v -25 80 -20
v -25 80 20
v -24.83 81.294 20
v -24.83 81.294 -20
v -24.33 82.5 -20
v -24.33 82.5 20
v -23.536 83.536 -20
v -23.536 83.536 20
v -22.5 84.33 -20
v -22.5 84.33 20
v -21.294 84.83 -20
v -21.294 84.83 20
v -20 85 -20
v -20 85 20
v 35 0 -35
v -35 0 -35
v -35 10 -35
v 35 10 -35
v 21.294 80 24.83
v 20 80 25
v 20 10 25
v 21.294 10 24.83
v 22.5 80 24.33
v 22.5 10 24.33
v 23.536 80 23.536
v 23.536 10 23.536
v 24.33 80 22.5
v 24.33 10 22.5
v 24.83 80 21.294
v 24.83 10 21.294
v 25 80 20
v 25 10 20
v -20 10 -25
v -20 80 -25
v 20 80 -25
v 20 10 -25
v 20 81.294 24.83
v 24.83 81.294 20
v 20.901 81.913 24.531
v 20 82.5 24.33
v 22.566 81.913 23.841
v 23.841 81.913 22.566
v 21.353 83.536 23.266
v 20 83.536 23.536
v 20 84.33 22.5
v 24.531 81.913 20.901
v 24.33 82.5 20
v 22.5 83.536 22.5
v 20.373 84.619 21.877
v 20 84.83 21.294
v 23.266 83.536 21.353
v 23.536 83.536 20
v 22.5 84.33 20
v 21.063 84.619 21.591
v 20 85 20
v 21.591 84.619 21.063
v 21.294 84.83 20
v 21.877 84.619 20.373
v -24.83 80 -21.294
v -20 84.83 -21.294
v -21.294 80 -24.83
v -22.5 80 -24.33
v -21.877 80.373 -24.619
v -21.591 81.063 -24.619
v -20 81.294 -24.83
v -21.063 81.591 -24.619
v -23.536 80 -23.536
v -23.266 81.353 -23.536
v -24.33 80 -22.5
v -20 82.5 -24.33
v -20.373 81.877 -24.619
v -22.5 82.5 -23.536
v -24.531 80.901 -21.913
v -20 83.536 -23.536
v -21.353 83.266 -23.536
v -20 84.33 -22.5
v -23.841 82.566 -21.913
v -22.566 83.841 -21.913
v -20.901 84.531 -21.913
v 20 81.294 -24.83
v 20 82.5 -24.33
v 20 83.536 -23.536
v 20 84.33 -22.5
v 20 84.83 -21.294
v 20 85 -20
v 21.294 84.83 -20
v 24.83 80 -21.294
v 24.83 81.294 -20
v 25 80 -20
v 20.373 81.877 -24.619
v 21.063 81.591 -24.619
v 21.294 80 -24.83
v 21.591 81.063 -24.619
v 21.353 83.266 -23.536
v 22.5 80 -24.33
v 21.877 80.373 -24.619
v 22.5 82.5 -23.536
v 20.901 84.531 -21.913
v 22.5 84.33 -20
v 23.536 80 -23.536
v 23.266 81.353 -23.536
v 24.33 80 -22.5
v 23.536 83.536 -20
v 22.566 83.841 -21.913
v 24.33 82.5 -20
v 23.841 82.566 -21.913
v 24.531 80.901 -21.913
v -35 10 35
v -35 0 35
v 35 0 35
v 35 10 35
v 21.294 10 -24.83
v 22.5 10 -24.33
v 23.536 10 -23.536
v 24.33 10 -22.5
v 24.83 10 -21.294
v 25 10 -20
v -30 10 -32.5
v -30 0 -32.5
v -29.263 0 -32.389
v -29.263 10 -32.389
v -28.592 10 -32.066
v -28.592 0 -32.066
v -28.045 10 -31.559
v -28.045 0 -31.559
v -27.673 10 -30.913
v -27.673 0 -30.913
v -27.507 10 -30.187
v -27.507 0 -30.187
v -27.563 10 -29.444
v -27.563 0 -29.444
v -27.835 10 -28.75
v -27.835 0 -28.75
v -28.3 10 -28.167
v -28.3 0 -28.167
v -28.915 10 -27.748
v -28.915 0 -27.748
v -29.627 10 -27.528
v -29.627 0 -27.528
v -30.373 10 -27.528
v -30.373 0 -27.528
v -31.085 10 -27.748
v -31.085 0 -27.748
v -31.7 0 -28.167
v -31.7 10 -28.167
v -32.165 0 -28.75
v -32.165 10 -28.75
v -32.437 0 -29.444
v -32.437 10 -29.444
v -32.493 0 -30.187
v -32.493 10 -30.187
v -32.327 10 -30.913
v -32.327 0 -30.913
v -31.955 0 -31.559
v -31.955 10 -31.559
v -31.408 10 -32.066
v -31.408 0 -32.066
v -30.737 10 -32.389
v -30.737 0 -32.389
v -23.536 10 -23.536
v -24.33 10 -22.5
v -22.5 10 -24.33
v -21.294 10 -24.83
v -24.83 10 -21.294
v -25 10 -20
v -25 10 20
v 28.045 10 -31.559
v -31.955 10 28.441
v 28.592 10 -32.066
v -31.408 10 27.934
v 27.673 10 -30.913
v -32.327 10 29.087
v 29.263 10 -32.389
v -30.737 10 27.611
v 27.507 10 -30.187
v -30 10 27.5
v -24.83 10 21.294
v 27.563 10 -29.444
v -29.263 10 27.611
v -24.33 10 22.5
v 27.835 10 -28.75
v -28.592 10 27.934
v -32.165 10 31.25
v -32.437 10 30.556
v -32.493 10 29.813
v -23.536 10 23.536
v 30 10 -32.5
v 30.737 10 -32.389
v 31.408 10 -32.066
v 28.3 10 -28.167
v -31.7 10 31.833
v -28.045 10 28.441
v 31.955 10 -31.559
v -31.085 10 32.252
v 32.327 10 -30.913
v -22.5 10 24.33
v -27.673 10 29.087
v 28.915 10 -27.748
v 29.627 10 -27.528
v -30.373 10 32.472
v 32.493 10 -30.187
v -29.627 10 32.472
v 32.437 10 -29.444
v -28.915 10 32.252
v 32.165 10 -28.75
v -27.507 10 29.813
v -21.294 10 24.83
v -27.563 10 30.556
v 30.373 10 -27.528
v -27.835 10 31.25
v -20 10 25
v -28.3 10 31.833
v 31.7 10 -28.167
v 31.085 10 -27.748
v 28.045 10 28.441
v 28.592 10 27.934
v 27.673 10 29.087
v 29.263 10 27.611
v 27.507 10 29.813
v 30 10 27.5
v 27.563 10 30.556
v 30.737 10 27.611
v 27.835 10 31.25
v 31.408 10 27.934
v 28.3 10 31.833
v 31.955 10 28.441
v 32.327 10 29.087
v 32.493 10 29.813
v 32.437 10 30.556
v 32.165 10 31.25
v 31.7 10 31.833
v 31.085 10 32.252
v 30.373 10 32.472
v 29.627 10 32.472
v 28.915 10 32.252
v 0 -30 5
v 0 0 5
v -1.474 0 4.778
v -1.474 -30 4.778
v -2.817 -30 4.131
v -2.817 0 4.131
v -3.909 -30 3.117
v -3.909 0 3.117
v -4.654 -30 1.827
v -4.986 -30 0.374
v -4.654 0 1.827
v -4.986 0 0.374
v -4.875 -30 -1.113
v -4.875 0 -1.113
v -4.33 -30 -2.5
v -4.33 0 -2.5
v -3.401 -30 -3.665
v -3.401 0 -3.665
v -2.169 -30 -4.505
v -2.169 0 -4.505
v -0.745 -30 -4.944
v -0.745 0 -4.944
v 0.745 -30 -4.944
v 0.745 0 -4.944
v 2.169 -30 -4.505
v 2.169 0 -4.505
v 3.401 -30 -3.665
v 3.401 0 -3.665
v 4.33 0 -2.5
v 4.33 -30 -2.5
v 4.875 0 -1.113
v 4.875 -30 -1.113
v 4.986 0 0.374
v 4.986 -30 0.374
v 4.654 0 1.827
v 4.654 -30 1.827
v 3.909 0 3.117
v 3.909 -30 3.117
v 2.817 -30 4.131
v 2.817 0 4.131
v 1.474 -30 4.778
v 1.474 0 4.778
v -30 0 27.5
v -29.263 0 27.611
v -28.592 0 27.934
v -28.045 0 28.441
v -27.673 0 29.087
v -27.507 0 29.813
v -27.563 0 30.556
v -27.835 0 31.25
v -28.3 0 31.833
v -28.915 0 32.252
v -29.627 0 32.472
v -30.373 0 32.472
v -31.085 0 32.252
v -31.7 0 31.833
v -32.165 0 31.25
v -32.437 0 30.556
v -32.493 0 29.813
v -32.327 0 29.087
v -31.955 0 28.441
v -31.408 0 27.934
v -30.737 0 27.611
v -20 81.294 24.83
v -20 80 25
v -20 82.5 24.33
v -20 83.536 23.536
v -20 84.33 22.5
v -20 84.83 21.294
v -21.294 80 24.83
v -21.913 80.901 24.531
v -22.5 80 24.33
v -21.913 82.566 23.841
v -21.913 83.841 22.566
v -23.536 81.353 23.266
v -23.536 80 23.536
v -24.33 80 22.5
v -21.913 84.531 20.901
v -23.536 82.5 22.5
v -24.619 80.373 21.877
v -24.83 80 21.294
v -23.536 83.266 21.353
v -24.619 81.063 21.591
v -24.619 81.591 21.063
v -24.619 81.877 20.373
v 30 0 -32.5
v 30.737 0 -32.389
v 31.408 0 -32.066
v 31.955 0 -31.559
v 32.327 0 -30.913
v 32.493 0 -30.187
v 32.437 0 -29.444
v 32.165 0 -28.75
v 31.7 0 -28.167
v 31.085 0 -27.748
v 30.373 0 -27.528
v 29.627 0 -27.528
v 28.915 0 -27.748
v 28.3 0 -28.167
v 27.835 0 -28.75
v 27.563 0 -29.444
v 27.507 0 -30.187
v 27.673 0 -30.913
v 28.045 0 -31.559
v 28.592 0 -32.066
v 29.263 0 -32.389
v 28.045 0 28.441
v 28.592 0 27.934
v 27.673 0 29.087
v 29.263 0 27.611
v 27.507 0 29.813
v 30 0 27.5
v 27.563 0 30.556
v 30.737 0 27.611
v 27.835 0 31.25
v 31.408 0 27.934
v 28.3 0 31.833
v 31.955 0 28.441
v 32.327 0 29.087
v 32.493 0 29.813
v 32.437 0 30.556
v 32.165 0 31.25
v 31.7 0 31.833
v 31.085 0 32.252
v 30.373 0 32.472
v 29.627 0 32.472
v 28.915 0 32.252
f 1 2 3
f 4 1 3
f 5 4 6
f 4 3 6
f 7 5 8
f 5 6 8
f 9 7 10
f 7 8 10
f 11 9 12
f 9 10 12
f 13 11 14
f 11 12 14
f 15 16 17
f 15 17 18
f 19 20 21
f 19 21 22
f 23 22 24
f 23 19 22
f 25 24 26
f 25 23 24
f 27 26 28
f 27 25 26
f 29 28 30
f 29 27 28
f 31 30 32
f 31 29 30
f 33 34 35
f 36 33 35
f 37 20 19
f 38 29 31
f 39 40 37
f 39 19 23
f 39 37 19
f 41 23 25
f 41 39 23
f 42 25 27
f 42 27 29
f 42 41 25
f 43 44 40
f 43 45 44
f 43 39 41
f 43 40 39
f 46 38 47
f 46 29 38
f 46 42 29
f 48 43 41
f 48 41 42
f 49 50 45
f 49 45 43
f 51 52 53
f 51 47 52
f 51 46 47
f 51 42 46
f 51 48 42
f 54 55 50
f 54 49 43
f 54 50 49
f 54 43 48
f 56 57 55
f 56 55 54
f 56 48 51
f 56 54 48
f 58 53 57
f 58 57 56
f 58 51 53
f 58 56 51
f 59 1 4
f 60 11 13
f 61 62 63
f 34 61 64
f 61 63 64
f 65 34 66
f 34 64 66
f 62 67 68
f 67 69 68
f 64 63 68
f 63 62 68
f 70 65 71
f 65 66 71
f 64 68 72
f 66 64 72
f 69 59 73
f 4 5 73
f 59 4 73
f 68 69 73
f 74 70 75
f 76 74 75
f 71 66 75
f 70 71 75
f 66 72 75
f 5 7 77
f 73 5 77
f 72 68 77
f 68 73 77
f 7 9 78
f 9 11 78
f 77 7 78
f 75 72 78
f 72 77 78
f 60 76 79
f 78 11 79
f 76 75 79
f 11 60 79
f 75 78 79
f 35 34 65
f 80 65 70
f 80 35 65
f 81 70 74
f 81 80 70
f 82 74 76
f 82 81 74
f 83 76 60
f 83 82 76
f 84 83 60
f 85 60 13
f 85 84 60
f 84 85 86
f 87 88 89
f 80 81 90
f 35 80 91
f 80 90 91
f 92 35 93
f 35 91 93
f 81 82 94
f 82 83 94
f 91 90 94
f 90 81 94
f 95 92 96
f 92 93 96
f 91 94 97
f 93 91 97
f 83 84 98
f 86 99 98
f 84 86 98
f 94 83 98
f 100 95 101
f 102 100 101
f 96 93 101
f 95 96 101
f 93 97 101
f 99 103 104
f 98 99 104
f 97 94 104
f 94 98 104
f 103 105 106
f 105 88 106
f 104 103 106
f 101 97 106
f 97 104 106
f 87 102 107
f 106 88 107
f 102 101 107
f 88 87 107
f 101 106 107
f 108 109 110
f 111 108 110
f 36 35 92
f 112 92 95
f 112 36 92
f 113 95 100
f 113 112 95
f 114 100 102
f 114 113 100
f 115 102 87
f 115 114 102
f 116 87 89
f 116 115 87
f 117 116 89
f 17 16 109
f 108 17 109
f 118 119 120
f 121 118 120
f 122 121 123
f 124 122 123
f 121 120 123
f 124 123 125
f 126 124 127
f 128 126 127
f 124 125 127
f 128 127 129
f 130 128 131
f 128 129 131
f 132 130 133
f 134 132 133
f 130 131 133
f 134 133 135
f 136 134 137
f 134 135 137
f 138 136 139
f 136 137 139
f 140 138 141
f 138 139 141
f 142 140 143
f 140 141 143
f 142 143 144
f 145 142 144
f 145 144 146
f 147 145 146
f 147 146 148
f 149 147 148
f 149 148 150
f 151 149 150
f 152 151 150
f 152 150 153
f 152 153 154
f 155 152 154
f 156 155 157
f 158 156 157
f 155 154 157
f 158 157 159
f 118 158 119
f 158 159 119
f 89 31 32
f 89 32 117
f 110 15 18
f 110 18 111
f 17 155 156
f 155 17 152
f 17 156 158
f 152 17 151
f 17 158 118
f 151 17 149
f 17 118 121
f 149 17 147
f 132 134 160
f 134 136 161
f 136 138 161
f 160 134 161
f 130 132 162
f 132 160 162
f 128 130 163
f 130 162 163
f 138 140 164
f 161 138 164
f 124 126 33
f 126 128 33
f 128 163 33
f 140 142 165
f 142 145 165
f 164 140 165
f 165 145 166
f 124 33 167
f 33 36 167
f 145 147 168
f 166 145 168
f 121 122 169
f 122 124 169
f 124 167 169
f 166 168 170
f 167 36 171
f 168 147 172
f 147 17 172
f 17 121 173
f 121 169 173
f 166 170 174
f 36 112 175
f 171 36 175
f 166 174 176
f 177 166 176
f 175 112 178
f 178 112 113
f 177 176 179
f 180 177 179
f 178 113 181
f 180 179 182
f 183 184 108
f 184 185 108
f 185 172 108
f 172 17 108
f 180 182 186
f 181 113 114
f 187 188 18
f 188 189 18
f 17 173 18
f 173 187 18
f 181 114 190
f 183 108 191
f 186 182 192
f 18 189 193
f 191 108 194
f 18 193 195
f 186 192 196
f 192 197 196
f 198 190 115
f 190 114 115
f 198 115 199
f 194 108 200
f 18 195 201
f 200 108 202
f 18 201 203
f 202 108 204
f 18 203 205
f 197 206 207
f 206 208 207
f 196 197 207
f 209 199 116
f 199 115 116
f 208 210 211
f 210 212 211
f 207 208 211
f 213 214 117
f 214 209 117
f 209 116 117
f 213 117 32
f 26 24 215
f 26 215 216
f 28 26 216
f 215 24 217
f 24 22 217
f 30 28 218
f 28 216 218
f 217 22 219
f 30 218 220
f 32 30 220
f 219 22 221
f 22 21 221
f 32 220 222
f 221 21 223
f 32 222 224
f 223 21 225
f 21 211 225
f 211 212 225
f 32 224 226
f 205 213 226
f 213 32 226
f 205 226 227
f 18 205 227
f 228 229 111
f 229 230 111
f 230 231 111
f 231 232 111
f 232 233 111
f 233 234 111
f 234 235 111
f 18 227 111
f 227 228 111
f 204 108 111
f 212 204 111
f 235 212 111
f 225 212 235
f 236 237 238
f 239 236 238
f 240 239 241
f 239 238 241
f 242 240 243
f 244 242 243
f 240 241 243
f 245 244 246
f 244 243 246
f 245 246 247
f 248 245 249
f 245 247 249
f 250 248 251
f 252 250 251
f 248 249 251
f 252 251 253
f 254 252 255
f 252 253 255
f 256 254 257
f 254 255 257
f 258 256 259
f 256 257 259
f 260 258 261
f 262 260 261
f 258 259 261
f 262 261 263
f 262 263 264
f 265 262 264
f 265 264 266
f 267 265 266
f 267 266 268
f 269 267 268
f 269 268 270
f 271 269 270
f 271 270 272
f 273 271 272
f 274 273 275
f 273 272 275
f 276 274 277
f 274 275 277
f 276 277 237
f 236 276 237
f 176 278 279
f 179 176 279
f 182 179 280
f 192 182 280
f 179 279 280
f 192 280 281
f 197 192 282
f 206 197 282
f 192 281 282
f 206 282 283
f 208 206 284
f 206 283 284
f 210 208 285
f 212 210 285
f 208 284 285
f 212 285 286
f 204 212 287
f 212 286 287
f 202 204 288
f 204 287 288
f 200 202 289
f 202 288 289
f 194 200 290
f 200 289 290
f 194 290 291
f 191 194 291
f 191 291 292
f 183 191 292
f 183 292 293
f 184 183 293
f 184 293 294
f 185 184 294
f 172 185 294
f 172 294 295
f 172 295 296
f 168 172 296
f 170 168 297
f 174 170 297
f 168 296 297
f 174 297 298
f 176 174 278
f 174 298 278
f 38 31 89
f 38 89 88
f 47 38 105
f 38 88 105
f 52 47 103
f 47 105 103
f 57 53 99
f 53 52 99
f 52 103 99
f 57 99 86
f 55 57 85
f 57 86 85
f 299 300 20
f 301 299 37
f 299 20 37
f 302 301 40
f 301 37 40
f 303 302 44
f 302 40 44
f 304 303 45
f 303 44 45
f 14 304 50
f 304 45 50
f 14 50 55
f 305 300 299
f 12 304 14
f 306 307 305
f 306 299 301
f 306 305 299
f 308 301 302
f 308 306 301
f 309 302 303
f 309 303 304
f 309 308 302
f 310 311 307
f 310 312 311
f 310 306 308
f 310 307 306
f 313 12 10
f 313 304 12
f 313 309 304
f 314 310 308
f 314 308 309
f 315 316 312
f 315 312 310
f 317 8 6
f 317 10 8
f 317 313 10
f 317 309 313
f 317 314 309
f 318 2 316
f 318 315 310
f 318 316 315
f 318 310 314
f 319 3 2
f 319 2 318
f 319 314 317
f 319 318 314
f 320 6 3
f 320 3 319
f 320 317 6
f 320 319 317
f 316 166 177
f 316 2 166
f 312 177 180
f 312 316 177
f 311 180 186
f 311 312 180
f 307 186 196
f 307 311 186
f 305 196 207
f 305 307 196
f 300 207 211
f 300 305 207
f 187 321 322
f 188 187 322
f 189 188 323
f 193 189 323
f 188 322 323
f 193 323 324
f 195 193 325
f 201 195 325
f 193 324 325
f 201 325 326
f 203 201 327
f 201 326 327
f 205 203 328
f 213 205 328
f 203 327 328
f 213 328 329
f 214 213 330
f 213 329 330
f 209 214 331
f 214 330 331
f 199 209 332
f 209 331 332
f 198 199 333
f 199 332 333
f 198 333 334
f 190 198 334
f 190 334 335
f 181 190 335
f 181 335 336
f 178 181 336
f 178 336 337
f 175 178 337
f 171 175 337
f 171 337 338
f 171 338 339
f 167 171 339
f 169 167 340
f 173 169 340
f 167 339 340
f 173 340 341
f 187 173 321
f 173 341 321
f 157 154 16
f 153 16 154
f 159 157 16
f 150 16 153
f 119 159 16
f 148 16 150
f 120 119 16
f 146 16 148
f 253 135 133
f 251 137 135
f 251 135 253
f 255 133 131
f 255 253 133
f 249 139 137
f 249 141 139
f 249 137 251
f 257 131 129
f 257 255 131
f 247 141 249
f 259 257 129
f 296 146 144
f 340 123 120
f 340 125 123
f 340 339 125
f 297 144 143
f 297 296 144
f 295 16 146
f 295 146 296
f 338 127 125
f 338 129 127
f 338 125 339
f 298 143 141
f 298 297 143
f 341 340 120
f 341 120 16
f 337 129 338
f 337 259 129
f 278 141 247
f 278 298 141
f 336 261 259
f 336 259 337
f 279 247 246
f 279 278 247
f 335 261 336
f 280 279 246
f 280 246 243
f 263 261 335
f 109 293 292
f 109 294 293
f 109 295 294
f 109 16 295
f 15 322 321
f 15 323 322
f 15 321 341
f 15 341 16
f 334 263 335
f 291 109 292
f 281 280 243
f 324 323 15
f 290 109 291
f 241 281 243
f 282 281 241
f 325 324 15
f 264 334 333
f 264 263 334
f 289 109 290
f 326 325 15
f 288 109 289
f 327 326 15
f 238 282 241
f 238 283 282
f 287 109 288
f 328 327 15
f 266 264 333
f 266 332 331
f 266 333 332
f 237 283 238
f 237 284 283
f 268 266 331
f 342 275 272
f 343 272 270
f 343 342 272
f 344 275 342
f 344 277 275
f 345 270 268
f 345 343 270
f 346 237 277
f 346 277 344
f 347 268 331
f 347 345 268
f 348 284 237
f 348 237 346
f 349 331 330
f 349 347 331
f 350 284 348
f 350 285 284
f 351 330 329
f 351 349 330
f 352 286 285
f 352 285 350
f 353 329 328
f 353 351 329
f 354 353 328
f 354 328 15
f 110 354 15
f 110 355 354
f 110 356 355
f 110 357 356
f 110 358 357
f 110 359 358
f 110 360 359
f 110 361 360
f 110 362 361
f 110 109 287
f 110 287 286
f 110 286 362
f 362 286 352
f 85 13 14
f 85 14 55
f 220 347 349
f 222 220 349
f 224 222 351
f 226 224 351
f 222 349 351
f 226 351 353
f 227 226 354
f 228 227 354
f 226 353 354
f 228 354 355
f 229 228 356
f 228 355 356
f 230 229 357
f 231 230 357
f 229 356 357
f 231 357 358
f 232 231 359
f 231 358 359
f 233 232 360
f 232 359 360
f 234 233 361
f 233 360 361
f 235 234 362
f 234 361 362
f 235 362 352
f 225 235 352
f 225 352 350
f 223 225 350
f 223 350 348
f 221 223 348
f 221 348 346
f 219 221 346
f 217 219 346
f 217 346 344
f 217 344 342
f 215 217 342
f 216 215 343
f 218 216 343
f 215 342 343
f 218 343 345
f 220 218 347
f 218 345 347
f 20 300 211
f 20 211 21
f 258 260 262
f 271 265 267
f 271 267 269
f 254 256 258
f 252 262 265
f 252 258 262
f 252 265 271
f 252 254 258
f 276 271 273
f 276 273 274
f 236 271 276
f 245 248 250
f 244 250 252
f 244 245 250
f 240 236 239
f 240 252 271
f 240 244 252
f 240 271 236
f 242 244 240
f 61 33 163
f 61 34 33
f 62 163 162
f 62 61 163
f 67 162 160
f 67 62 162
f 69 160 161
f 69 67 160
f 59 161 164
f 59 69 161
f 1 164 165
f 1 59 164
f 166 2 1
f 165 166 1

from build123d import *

# Parameters (mm, degrees)
SKETCH1_W           = 50
SKETCH1_H           = 50
BOSS_EXTRUDE1_DEPTH = 85
SKETCH2_R           = 5
BOSS_EXTRUDE2_DEPTH = 30
FILLET1_R           = 5
FILLET2_R           = 5
SKETCH3_W           = 70
SKETCH3_H           = 70
BOSS_EXTRUDE3_DEPTH = 10
FILLET3_R           = 5
SKETCH4_R           = 2.5
CUT_EXTRUDE1_DEPTH  = 10


with BuildPart() as part:
    # Sketch1 → Boss-Extrude1 (new body)
    with BuildSketch(Plane(origin=(0, 0, 0), x_dir=(1, 0, 0), z_dir=(0, 1, 0))):
        Rectangle(SKETCH1_W, SKETCH1_H)
    extrude(amount=BOSS_EXTRUDE1_DEPTH)

    # Sketch2 → Boss-Extrude2 (add)
    with BuildSketch(Plane.XZ):
        with Locations(Location((0, 0, 0), (0, 0, 90))):
            Circle(SKETCH2_R)
    extrude(amount=BOSS_EXTRUDE2_DEPTH)

    # Fillet1
    fillet1_edges = [part.edges().sort_by_distance(p)[0] for p in [
        (0, 85, 25),
        (0, 0, 25),
        (25, 42.5, 25),
        (-25, 42.5, 25),
    ]]
    fillet(fillet1_edges, radius=FILLET1_R)

    # Fillet2
    # the kernel refuses this fillet: 5 mm, written as the material it takes off along each edge
    with BuildSketch(Plane(origin=(-20, 80, 20), x_dir=(0, 1, 0), z_dir=(-1, 0, 0))) as fillet2_piece_1_section:
        Polygon((0, 0), (FILLET2_R, 0), (FILLET2_R, -FILLET2_R), (0, -FILLET2_R), align=None)
    fillet2_piece_1 = extrude(amount=FILLET2_R, mode=Mode.PRIVATE)
    fillet2_piece_1 = fillet2_piece_1 - Plane(origin=(-20, 80, 20), x_dir=(0, -0.7071067811865475, -0.7071067811865475), z_dir=(-1, 0, 0)) * Sphere(FILLET2_R, mode=Mode.PRIVATE)
    add(fillet2_piece_1, mode=Mode.SUBTRACT)
    with BuildSketch(Plane(origin=(20, 80, 20), x_dir=(1, 0, 0), z_dir=(0, 1, 0))) as fillet2_piece_2_section:
        Polygon((0, 0), (FILLET2_R, 0), (FILLET2_R, -FILLET2_R), (0, -FILLET2_R), align=None)
    fillet2_piece_2 = extrude(amount=FILLET2_R, mode=Mode.PRIVATE)
    fillet2_piece_2 = fillet2_piece_2 - Plane(origin=(20, 80, 20), x_dir=(-0.7071067811865475, 0, -0.7071067811865475), z_dir=(0, 1, 0)) * Sphere(FILLET2_R, mode=Mode.PRIVATE)
    add(fillet2_piece_2, mode=Mode.SUBTRACT)
    with BuildSketch(Plane(origin=(-20, 5, 20), x_dir=(0, -1, 0), z_dir=(-1, 0, 0))) as fillet2_piece_3_section:
        Polygon((0, 0), (FILLET2_R, 0), (FILLET2_R, FILLET2_R), (0, FILLET2_R), align=None)
    fillet2_piece_3 = extrude(amount=FILLET2_R, mode=Mode.PRIVATE)
    fillet2_piece_3 = fillet2_piece_3 - Plane(origin=(-20, 5, 20), x_dir=(0, 0.7071067811865475, -0.7071067811865475), z_dir=(-1, 0, 0)) * Sphere(FILLET2_R, mode=Mode.PRIVATE)
    add(fillet2_piece_3, mode=Mode.SUBTRACT)
    with BuildSketch(Plane(origin=(20, 5, 20), x_dir=(1, 0, 0), z_dir=(0, -1, 0))) as fillet2_piece_4_section:
        Polygon((0, 0), (FILLET2_R, 0), (FILLET2_R, FILLET2_R), (0, FILLET2_R), align=None)
    fillet2_piece_4 = extrude(amount=FILLET2_R, mode=Mode.PRIVATE)
    fillet2_piece_4 = fillet2_piece_4 - Plane(origin=(20, 5, 20), x_dir=(-0.7071067811865475, 0, -0.7071067811865475), z_dir=(0, -1, 0)) * Sphere(FILLET2_R, mode=Mode.PRIVATE)
    add(fillet2_piece_4, mode=Mode.SUBTRACT)
    with BuildSketch(Plane(origin=(-25, 85, 20), x_dir=(0, -1, 0), z_dir=(0, 0, -1)), Plane(origin=(25, 0, -37.5), x_dir=(-1, 0, 0), z_dir=(0, 0, 1))) as fillet2_piece_5:
        with BuildLine():
            CenterArc((FILLET2_R, -FILLET2_R), FILLET2_R, 90, 90)
            Line((0, -FILLET2_R), (0, 0))
            Line((0, 0), (FILLET2_R, 0))
        make_face()
    extrude(amount=57.5, mode=Mode.SUBTRACT)
    with BuildSketch(Plane(origin=(25, 85, -37.5), x_dir=(-1, 0, 0), z_dir=(0, 0, 1)), Plane(origin=(-25, 0, 20), x_dir=(0, 1, 0), z_dir=(0, 0, -1))) as fillet2_piece_6:
        with BuildLine():
            CenterArc((FILLET2_R, FILLET2_R), FILLET2_R, 180, 90)
            Line((0, FILLET2_R), (0, 0))
            Line((0, 0), (FILLET2_R, 0))
        make_face()
    extrude(amount=57.5, mode=Mode.SUBTRACT)

    # Sketch3 → Boss-Extrude3 (add)
    with BuildSketch(Plane.XZ):
        Rectangle(SKETCH3_W, SKETCH3_H)
    extrude(amount=-BOSS_EXTRUDE3_DEPTH)

    # Fillet3
    fillet3_edges = [part.edges().sort_by_distance(p)[0] for p in [
        (0, 85, -25),
        (-25, 45, -25),
        (25, 45, -25),
        (23.535533906, 83.535533906, -25),
        (-23.535533906, 83.535533906, -25),
    ]]
    fillet(fillet3_edges, radius=FILLET3_R)

    # Sketch4 → Cut-Extrude1 (cut)
    with BuildSketch(Plane.XZ):
        with Locations(Location((-30, 30, 0), (0, 0, 270))):
            Circle(SKETCH4_R)
        with Locations(Location((30, 30, 0), (0, 0, 270))):
            Circle(SKETCH4_R)
        with Locations(Location((30, -30, 0), (0, 0, 270))):
            Circle(SKETCH4_R)
        with Locations(Location((-30, -30, 0), (0, 0, 270))):
            Circle(SKETCH4_R)
    extrude(amount=-CUT_EXTRUDE1_DEPTH, mode=Mode.SUBTRACT)


solid = part.part
